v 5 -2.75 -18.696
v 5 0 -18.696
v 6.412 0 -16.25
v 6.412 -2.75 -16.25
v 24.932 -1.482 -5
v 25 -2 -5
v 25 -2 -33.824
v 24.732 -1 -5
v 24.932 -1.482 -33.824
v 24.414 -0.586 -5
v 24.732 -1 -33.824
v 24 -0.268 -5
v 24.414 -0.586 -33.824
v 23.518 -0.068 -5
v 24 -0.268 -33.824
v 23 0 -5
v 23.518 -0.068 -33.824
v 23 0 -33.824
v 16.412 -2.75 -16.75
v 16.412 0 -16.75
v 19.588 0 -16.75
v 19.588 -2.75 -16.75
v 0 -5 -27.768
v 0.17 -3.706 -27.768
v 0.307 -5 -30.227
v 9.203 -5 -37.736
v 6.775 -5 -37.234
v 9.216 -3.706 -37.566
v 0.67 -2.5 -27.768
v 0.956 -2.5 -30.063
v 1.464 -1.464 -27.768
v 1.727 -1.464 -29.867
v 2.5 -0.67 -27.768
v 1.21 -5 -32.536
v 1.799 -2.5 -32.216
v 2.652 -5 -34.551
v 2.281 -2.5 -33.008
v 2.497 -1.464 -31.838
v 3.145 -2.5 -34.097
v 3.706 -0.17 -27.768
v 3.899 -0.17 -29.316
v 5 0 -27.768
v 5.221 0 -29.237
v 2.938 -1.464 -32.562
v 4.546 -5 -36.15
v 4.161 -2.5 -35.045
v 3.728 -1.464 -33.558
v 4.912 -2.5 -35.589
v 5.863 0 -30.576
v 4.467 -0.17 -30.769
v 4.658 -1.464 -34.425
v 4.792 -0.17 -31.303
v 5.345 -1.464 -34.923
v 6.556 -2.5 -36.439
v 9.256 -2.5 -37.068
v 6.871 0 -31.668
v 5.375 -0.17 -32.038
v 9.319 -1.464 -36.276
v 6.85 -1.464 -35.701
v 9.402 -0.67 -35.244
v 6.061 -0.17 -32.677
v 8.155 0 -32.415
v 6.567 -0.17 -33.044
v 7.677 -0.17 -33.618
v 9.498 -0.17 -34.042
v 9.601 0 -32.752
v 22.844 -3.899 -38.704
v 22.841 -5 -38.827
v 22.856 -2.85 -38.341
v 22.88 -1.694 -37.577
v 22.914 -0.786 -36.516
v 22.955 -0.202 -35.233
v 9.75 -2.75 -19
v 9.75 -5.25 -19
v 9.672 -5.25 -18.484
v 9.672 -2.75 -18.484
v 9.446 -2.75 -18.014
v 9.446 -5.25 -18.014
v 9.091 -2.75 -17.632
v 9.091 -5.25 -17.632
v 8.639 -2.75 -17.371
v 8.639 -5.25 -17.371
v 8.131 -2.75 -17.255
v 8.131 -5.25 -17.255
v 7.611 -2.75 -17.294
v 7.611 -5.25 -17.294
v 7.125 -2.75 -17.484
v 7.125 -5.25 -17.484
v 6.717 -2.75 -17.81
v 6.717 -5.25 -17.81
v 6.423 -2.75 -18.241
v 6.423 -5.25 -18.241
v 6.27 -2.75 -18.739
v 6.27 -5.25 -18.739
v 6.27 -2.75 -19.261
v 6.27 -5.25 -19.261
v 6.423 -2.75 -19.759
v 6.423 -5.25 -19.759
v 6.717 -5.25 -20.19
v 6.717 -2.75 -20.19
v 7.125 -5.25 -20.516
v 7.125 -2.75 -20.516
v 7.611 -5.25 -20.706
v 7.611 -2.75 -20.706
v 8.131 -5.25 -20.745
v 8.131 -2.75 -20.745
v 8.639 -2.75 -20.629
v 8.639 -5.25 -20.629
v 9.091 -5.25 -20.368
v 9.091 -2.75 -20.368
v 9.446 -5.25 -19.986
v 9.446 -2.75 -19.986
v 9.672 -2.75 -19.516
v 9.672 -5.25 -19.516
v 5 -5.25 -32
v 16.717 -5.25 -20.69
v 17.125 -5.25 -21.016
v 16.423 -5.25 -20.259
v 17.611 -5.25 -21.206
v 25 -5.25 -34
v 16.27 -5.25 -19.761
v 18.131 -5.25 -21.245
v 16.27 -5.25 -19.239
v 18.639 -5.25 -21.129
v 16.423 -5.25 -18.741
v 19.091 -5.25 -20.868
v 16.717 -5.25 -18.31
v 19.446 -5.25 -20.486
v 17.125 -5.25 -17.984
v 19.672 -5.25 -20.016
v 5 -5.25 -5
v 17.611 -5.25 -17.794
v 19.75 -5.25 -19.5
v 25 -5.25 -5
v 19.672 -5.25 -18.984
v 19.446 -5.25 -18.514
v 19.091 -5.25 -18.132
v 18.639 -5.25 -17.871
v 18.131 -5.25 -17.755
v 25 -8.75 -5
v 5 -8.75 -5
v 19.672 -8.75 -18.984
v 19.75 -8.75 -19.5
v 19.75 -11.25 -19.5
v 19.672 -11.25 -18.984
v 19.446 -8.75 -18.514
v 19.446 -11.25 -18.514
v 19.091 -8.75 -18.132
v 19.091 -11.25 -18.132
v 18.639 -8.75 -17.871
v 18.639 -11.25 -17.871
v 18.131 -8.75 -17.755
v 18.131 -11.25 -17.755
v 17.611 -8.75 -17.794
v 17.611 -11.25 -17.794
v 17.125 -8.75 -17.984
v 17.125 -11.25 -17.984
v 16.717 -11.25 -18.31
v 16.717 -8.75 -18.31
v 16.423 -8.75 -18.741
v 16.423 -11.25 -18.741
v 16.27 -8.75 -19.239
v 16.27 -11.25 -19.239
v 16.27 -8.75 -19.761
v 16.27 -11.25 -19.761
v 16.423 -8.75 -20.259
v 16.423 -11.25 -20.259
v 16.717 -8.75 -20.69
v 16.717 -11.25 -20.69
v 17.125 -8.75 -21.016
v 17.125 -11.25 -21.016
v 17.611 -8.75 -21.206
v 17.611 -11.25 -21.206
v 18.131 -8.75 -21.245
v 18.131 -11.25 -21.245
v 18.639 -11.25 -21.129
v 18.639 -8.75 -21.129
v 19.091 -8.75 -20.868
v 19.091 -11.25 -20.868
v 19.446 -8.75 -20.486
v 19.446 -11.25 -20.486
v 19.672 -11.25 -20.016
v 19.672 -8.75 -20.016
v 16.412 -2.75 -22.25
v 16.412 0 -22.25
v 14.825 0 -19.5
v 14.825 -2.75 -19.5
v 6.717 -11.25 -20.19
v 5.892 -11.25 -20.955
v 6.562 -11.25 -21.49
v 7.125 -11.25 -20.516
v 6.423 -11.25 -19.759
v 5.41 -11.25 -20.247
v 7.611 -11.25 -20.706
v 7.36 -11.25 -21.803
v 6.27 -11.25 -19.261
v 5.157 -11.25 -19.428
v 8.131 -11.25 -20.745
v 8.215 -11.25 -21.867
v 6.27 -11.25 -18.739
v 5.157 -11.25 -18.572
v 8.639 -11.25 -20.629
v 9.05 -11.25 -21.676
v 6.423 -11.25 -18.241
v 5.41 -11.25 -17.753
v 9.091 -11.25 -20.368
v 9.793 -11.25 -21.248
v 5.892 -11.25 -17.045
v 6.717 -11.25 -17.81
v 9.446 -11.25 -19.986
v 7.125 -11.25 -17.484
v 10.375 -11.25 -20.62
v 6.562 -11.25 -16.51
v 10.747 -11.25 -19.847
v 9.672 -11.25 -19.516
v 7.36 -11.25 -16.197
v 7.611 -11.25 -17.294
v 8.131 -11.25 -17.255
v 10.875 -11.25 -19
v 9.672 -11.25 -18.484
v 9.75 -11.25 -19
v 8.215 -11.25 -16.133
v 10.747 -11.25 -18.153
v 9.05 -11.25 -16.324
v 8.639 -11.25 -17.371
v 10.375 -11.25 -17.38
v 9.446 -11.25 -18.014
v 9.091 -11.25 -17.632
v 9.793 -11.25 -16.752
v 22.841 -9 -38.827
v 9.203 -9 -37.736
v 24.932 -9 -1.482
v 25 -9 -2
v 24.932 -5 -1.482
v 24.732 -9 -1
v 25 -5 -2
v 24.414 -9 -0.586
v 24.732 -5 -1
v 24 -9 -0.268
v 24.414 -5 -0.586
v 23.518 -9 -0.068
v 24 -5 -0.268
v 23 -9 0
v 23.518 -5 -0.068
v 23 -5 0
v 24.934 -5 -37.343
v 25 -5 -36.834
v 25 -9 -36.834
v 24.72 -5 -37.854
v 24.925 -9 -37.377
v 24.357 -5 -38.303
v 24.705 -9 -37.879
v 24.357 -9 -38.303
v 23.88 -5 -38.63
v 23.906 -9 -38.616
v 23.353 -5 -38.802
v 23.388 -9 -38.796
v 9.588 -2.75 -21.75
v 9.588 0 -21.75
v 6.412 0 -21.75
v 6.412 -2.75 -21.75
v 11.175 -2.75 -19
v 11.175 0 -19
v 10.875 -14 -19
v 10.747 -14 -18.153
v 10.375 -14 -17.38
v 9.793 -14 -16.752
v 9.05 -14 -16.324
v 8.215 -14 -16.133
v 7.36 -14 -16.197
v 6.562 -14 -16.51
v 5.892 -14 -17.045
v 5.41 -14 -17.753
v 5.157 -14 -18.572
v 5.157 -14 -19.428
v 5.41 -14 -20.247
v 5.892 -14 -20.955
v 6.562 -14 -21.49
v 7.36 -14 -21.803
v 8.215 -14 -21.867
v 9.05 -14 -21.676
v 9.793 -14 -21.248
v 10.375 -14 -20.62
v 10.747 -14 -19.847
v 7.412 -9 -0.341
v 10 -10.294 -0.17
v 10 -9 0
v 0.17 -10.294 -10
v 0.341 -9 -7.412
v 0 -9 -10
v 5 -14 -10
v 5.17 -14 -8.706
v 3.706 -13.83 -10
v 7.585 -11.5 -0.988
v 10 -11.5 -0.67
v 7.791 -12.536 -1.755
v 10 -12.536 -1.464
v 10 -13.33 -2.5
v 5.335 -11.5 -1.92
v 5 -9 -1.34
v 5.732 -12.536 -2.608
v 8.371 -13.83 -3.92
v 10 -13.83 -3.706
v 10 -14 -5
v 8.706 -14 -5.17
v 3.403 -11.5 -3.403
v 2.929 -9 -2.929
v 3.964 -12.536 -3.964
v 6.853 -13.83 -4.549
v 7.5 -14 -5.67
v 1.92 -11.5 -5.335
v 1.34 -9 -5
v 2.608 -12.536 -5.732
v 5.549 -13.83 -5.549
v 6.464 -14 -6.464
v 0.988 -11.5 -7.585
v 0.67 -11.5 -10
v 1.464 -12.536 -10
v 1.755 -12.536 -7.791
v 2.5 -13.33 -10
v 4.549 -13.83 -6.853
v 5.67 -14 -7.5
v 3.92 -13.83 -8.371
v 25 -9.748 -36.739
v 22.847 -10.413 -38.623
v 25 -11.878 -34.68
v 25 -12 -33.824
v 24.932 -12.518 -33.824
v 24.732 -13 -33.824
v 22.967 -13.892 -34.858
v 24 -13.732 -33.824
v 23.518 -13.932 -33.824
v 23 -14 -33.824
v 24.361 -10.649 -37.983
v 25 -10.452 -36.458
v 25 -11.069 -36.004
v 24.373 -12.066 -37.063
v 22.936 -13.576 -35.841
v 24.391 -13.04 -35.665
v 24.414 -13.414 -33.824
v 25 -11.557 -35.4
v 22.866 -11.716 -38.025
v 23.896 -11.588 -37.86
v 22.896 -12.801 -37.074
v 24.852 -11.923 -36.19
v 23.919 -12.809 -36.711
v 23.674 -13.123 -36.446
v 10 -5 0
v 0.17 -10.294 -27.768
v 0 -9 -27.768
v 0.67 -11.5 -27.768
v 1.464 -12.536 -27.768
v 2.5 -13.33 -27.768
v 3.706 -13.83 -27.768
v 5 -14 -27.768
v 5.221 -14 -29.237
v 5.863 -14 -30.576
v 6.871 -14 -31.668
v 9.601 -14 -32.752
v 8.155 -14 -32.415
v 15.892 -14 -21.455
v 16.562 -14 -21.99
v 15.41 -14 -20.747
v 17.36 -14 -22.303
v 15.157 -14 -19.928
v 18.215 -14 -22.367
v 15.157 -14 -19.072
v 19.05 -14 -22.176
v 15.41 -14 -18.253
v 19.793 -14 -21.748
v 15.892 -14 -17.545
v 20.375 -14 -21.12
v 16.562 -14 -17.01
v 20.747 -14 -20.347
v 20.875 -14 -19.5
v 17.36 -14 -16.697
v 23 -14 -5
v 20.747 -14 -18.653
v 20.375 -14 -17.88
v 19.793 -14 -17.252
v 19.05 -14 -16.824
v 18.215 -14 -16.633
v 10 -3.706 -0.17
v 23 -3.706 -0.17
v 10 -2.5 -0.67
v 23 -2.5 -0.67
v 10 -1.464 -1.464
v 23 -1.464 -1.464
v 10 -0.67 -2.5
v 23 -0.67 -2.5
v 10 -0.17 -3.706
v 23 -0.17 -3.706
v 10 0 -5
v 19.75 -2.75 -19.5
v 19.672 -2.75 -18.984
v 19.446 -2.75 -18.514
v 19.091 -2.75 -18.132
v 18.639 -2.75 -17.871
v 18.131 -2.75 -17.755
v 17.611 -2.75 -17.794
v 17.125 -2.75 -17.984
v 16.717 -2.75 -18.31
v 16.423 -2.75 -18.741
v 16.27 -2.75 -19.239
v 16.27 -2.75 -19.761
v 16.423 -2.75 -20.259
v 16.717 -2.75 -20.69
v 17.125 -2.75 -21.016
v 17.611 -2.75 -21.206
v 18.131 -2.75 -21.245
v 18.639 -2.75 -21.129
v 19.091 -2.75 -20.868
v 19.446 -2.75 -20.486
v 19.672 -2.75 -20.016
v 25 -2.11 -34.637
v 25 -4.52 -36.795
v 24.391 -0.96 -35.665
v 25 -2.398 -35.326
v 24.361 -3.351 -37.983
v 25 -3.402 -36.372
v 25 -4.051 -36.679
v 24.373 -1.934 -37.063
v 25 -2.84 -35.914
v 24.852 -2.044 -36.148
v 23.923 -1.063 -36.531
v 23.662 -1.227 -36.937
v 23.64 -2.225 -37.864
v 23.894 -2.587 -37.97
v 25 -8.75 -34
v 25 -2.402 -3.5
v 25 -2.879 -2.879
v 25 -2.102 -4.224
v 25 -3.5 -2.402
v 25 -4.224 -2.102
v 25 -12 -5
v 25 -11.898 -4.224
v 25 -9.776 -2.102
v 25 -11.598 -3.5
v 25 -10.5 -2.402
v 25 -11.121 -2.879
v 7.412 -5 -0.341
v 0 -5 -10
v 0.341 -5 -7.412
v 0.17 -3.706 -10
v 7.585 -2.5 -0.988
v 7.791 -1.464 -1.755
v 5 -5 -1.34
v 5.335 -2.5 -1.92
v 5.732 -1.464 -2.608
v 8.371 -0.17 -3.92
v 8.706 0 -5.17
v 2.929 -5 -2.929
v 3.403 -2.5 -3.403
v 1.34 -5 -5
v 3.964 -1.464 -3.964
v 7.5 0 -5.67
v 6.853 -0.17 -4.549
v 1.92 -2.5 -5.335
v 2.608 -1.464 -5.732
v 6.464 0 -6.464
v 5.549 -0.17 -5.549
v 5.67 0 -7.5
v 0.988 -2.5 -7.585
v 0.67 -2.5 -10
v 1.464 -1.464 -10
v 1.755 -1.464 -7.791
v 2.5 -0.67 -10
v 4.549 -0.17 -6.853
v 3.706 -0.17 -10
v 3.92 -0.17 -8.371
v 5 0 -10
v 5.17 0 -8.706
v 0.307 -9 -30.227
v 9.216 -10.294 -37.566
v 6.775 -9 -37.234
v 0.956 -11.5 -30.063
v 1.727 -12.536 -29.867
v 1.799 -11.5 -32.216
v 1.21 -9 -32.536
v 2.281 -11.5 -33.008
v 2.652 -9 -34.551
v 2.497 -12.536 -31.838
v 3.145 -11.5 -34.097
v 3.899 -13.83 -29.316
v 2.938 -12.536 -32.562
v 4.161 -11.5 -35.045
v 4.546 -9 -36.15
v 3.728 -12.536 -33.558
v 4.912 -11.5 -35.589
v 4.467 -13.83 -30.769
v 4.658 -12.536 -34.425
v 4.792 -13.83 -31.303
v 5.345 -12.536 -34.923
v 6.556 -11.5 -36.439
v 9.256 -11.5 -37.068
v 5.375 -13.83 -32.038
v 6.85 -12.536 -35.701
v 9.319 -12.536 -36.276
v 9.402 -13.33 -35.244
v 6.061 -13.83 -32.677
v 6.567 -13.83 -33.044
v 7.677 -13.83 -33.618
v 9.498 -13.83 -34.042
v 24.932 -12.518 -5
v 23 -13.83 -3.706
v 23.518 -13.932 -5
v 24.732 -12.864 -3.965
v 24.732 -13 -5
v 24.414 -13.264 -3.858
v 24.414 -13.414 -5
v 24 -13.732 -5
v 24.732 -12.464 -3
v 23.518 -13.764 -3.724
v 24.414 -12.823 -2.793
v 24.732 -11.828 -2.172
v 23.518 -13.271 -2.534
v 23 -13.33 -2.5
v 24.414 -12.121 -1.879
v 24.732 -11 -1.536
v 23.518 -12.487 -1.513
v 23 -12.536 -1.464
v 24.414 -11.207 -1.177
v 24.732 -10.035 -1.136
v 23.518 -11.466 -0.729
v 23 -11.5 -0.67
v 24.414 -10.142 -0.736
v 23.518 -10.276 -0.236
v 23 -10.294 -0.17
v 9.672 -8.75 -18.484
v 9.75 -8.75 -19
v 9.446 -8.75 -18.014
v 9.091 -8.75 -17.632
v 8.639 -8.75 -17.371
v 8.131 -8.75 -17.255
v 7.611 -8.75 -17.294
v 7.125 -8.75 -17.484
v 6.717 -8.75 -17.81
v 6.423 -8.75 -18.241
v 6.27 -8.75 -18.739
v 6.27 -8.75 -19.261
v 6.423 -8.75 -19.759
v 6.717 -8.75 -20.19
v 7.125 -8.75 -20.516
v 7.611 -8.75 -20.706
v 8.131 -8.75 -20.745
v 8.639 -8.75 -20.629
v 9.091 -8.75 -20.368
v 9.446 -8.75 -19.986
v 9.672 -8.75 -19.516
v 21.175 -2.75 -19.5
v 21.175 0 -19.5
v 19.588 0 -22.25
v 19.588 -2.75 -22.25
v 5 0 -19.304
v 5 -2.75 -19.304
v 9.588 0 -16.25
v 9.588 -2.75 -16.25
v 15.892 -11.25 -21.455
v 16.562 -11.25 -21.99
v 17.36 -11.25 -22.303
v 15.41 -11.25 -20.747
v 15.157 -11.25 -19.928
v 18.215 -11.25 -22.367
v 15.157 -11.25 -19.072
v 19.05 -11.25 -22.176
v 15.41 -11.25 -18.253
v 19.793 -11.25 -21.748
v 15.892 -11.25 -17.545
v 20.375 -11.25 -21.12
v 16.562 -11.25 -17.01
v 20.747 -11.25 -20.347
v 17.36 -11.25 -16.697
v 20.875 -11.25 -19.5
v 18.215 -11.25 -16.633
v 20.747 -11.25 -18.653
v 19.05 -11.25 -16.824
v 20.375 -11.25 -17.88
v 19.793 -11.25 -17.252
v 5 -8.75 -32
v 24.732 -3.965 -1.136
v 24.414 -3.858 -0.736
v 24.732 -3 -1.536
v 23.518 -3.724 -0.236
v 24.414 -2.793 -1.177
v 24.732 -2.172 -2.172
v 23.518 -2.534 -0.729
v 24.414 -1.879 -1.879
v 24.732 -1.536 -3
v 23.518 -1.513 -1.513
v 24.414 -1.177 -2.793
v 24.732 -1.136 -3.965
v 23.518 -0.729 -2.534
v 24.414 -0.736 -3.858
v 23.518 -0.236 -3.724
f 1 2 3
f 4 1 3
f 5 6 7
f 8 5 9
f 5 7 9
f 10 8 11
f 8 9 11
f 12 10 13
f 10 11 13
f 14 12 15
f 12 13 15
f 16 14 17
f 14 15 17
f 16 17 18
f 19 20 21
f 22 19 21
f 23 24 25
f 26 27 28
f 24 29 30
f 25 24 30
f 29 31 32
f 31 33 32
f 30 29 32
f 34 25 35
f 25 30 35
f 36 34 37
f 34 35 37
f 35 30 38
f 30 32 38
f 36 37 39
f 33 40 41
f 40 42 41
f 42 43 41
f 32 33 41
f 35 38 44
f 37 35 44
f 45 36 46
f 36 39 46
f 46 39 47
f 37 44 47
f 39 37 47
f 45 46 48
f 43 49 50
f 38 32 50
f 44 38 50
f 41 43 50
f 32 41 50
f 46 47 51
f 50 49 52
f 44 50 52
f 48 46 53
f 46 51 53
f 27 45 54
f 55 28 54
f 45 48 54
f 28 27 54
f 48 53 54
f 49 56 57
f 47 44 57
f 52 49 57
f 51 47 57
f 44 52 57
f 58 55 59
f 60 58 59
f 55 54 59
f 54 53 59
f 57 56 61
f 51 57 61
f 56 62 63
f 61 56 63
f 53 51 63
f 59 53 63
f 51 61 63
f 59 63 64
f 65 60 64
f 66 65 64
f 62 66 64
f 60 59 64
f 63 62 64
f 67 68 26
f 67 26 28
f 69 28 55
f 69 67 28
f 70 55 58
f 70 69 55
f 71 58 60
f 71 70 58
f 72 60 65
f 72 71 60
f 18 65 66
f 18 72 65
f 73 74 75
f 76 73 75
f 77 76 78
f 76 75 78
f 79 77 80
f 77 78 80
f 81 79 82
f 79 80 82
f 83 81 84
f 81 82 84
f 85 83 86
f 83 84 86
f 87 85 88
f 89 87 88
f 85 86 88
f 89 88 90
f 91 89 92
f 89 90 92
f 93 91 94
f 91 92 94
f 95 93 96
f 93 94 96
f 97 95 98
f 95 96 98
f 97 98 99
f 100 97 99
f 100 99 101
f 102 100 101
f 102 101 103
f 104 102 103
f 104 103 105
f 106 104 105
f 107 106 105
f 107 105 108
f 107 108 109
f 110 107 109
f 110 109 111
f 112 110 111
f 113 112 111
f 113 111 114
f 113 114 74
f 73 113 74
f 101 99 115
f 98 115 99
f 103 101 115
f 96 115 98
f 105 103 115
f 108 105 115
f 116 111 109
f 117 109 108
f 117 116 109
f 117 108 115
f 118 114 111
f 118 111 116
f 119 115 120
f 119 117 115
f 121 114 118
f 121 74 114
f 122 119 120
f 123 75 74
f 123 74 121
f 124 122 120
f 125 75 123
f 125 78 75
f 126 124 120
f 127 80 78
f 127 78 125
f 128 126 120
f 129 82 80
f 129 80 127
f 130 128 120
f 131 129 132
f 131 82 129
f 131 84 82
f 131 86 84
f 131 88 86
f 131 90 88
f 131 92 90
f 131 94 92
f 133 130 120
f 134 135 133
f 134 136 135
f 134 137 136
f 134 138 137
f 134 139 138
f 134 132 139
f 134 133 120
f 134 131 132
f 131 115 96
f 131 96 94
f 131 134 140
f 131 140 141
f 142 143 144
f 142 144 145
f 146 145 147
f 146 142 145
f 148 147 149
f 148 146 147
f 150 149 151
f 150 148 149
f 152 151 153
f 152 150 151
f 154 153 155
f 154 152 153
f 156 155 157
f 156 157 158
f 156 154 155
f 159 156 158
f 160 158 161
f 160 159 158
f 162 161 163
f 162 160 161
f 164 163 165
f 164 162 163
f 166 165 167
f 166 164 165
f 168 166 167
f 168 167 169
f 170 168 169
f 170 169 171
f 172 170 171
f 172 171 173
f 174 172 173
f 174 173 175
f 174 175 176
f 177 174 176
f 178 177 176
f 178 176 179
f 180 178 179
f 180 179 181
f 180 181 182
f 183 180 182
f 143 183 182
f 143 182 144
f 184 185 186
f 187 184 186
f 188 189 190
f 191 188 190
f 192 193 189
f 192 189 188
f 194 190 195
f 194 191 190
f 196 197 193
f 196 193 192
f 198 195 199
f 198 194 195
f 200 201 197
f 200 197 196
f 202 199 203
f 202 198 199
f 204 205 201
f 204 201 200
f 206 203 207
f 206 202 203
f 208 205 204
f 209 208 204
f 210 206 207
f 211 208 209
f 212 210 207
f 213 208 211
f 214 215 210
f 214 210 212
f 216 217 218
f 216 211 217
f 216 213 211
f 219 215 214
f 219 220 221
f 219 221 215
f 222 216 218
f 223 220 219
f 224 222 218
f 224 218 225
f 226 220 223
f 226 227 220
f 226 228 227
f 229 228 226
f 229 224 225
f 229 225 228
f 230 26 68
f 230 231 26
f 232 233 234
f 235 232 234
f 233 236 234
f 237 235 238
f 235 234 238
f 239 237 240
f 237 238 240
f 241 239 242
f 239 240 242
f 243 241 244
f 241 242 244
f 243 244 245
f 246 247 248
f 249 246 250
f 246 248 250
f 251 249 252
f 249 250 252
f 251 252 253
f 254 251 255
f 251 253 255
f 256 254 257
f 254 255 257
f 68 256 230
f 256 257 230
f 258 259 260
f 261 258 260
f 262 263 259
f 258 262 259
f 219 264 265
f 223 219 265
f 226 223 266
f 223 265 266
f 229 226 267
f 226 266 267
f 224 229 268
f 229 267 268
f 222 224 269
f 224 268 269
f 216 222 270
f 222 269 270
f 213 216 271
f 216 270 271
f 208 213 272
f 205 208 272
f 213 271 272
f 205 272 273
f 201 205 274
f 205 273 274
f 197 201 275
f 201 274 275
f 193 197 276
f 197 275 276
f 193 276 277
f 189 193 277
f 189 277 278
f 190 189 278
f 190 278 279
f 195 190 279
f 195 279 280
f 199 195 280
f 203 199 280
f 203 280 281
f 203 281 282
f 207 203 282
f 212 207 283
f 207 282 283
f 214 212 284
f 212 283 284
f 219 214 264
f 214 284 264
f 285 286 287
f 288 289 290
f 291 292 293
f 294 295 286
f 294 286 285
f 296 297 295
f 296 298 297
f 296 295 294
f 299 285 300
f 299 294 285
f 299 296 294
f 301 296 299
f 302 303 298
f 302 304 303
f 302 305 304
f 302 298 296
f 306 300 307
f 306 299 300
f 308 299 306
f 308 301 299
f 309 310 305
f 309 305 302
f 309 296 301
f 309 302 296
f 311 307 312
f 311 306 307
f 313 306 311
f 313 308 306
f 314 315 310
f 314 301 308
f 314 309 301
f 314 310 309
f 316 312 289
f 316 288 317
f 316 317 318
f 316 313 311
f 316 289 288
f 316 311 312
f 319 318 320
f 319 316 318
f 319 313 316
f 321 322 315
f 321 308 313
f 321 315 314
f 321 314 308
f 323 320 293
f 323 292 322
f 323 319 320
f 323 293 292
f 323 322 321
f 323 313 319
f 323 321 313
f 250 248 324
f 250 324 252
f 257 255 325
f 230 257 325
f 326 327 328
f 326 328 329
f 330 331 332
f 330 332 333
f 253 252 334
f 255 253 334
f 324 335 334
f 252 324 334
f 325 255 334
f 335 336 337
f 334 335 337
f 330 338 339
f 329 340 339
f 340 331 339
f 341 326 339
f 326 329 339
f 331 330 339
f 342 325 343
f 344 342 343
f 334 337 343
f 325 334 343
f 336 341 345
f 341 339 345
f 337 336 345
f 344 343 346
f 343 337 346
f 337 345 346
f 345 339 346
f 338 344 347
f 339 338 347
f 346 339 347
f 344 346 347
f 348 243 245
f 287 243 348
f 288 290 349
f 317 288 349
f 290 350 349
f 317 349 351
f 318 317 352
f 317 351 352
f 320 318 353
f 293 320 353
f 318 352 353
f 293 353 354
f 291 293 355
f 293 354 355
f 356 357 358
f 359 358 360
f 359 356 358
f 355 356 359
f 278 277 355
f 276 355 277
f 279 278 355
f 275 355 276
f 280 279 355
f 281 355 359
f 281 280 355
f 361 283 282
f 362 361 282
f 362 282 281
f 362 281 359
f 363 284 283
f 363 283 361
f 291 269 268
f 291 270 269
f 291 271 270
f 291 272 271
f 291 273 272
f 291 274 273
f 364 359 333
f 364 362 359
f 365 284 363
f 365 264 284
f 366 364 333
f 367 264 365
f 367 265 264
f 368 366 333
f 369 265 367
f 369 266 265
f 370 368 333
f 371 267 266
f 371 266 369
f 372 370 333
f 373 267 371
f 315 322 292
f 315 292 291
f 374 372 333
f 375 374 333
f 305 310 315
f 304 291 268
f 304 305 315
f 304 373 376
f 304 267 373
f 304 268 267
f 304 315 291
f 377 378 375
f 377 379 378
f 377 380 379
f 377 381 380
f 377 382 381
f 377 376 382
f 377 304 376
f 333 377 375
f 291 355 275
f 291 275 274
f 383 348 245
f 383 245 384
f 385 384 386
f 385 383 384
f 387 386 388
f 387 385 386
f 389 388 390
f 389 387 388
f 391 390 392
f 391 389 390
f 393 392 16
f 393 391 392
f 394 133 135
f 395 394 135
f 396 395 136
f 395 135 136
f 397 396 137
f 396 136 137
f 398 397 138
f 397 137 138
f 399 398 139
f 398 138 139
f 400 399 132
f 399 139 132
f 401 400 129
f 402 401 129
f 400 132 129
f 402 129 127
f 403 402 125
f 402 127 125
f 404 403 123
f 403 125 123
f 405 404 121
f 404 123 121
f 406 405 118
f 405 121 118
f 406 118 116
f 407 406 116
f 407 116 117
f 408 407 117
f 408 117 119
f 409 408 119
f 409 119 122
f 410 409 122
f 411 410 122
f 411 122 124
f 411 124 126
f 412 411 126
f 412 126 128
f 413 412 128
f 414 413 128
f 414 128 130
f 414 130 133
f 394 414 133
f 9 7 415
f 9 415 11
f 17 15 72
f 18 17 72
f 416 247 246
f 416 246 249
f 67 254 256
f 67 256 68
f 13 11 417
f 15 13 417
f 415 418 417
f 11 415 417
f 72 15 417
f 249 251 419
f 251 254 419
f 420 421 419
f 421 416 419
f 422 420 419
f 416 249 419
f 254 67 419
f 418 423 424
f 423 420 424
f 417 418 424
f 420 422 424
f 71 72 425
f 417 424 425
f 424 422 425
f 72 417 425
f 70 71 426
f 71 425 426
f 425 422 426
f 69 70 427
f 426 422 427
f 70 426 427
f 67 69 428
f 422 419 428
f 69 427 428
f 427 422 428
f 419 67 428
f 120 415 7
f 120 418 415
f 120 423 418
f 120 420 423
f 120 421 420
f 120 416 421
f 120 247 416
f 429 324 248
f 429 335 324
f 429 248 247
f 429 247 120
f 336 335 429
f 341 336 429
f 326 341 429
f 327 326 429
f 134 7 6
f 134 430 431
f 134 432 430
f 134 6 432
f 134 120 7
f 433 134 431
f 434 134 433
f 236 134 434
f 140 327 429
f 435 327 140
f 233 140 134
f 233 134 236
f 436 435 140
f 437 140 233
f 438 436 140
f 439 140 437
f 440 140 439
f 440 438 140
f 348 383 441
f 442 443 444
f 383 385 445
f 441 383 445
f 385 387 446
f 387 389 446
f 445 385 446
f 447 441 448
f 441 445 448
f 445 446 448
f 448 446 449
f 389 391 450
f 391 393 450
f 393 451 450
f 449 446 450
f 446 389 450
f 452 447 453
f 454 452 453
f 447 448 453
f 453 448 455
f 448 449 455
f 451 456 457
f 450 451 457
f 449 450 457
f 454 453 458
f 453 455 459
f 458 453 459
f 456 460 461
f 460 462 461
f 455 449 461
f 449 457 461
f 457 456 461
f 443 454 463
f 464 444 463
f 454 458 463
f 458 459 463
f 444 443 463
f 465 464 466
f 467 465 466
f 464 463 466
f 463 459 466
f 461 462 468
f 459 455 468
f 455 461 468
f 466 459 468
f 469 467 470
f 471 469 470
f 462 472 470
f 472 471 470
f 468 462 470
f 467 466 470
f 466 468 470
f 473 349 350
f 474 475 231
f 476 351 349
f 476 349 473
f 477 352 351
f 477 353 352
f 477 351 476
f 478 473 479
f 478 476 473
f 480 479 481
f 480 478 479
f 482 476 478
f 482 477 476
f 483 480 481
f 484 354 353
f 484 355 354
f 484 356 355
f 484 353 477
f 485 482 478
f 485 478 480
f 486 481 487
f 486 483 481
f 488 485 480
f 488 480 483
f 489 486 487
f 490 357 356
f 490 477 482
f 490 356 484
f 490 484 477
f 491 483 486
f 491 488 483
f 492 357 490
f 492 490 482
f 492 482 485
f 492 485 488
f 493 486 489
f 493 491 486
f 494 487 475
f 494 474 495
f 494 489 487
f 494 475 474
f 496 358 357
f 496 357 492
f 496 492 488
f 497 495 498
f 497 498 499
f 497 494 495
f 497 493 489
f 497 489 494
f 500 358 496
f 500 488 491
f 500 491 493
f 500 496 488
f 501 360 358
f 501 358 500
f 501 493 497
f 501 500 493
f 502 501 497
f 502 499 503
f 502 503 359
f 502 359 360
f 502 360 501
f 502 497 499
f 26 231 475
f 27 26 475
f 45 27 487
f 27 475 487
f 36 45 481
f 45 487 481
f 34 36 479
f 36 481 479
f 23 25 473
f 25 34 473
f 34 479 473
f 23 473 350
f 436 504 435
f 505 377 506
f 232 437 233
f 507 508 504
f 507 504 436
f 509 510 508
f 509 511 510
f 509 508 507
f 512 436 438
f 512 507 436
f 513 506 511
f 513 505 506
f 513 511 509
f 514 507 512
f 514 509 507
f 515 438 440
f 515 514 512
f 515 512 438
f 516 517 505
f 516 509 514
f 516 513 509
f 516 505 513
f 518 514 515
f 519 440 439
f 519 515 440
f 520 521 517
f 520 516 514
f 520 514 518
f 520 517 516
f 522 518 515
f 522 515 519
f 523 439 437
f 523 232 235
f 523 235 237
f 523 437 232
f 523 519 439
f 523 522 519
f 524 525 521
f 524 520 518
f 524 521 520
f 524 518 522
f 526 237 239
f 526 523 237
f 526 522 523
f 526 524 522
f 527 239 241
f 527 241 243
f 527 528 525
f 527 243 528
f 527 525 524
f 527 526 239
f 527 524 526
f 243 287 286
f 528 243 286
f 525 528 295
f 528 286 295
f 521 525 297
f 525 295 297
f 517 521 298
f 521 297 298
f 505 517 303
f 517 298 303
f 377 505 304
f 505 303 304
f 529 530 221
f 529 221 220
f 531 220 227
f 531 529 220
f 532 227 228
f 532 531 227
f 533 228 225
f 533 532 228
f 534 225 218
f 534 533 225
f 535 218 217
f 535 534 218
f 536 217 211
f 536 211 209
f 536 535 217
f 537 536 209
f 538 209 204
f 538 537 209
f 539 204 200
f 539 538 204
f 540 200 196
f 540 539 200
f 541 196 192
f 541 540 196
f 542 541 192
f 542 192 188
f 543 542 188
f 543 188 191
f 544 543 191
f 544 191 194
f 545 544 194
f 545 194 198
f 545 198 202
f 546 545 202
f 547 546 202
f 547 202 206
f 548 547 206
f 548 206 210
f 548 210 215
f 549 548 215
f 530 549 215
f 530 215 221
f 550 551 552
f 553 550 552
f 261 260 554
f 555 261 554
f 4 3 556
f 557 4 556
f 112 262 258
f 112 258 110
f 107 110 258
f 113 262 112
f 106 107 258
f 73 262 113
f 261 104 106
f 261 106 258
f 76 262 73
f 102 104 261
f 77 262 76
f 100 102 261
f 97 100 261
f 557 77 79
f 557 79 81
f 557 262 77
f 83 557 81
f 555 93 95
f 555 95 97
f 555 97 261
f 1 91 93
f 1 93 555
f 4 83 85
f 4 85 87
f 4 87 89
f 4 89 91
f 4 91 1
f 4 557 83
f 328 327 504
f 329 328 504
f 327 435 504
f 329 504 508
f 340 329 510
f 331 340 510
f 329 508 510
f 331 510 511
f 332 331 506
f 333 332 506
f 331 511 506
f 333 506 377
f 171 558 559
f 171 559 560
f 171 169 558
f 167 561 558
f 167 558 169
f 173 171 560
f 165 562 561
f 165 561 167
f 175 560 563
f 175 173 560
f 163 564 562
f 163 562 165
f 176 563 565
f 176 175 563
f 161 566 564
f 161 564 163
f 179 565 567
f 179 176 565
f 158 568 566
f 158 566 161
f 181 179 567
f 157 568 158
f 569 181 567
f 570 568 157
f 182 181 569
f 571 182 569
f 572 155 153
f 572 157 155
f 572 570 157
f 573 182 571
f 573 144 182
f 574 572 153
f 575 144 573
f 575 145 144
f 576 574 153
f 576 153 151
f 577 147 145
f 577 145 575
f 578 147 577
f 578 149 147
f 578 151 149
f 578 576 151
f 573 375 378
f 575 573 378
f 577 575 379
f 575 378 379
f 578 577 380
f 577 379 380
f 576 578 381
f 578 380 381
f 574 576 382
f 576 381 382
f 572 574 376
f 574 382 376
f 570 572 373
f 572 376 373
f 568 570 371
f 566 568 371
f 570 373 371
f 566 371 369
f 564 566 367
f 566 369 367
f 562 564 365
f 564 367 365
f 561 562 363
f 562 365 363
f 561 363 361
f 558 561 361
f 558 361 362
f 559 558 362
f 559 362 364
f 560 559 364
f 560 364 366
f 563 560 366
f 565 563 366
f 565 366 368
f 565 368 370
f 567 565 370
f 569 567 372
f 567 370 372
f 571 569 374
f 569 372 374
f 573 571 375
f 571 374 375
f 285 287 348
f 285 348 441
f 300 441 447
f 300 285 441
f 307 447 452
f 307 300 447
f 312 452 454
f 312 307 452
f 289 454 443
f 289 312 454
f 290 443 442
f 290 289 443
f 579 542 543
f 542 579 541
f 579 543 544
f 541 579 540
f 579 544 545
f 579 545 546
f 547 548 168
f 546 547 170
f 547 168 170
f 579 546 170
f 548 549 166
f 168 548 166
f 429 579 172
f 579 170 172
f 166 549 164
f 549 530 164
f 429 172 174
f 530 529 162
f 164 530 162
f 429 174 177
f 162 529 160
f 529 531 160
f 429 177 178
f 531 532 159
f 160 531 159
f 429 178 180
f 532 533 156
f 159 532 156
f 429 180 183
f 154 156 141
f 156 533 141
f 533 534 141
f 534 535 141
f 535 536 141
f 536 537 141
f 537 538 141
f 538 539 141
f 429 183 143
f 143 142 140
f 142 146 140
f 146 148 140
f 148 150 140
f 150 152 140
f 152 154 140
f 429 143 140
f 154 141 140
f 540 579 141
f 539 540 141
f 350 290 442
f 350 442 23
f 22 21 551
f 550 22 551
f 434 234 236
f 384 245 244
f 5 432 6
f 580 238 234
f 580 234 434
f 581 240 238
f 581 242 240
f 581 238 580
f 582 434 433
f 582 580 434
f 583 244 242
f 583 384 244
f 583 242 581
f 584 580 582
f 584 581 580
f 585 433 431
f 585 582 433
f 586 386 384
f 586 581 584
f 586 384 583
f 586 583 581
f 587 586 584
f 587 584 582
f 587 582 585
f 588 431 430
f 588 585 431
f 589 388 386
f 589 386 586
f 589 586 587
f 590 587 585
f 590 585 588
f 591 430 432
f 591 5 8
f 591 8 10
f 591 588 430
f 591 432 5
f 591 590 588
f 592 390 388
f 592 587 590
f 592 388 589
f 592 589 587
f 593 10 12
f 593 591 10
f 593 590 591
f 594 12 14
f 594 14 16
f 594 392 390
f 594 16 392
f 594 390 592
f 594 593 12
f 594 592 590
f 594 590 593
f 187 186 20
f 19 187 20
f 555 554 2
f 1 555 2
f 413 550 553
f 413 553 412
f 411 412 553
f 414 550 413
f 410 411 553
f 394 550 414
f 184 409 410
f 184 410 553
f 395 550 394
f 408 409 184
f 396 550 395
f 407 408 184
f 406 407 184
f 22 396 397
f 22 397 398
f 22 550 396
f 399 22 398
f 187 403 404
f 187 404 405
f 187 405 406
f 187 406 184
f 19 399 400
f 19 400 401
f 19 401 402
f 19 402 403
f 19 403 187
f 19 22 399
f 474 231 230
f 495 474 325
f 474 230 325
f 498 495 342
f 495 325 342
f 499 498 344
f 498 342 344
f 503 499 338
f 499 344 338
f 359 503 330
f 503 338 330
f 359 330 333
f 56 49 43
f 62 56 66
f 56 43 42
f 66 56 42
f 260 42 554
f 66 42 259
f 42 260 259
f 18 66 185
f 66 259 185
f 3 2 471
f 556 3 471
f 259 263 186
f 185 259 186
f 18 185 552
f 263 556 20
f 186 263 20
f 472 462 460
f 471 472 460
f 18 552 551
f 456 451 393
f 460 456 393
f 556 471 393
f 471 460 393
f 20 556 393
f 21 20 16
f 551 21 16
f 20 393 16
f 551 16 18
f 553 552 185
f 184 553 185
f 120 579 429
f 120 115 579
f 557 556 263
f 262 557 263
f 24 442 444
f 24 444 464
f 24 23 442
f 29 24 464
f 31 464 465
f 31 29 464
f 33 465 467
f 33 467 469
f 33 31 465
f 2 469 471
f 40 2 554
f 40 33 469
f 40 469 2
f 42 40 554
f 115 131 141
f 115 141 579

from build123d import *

# Parameters (mm, degrees)
F1_DEPTH  = 7
F3_DEPTH  = 1.75
F4_R      = 1.75
F5_DEPTH  = 5.25
F7_R      = 10
F8_R      = 5
F9_R      = 2
F10_R     = 2.875
F10_R_2   = 1.75
F11_DEPTH = 2.75
F12_R     = 1.75
F13_DEPTH = 2.75


with BuildPart() as f1:
    # F0 (on Front) → F1 (new body)
    with BuildSketch(Plane.XZ):
        Polygon((25, 0), (0, 0), (0, -37), (25, -39), align=None)
    extrude(amount=F1_DEPTH)

    # F2 (on face) → F3 (cut)
    with BuildSketch(Plane.XZ.offset(7)):
        Polygon((25, -34), (25, -5), (5, -5), (5, -32), align=None)
    extrude(amount=-F3_DEPTH, mode=Mode.SUBTRACT)

    # F4 (on face) → F5 (cut)
    with BuildSketch(Plane.XZ.offset(5.25)):
        with Locations((8, -19)):
            Circle(F4_R)
        with Locations((18, -19.5)):
            Circle(F4_R)
    extrude(amount=-F5_DEPTH, mode=Mode.SUBTRACT)

    # F6: F1 across face


with BuildPart() as f1_1:
    add(f1.part)
    add(f1.part.mirror(Plane(origin=(9.0064102564, -7, -19.0021367521), x_dir=(1, 0, 0), z_dir=(0, -1, 0))))

    # F7
    f7_edges = [f1_1.edges().sort_by_distance(p)[0] for p in [
        (0, -7, 0),
        (0, -7, -37),
    ]]
    fillet(f7_edges, radius=F7_R)

    # F8
    f8_edges = [f1_1.edges().sort_by_distance(p)[0] for p in [
        (17.5, -14, 0),
        (17.5, 0, 0),
    ]]
    fillet(f8_edges, radius=F8_R)

    # F9
    f9_edges = [f1_1.edges().sort_by_distance(p)[0] for p in [
        (25, -14, -19.492013),
    ]]
    fillet(f9_edges, radius=F9_R)

    # F10 (on face) → F11 (cut)
    with BuildSketch(Plane.XZ.offset(14)):
        with Locations((8, -19)):
            Circle(F10_R)
        with Locations((8, -19)):
            Circle(F10_R_2, mode=Mode.SUBTRACT)
        with Locations((18, -19.5)):
            Circle(F10_R)
        with Locations((18, -19.5)):
            Circle(F10_R_2, mode=Mode.SUBTRACT)
    extrude(amount=-F11_DEPTH, mode=Mode.SUBTRACT)

    # F12 (on face) → F13 (cut)
    with BuildSketch(Plane(origin=(0, 0, 0), x_dir=(-1, 0, 0), z_dir=(0, 1, 0))):
        Polygon((-16.4122867597, -16.75), (-19.5877132403, -16.75), (-21.1754264805, -19.5), (-19.5877132403, -22.25), (-16.4122867597, -22.25), (-14.8245735195, -19.5), align=None)
        with Locations((-18, -19.5)):
            Circle(F12_R, mode=Mode.SUBTRACT)
        Polygon((-6.4122867597, -16.25), (-9.5877132403, -16.25), (-11.1754264805, -19), (-9.5877132403, -21.75), (-6.4122867597, -21.75), (-5, -19.3038475773), (-5, -18.6961524227), align=None)
        with Locations((-8, -19)):
            Circle(F12_R, mode=Mode.SUBTRACT)
    extrude(amount=-F13_DEPTH, mode=Mode.SUBTRACT)


solid = f1_1.part
